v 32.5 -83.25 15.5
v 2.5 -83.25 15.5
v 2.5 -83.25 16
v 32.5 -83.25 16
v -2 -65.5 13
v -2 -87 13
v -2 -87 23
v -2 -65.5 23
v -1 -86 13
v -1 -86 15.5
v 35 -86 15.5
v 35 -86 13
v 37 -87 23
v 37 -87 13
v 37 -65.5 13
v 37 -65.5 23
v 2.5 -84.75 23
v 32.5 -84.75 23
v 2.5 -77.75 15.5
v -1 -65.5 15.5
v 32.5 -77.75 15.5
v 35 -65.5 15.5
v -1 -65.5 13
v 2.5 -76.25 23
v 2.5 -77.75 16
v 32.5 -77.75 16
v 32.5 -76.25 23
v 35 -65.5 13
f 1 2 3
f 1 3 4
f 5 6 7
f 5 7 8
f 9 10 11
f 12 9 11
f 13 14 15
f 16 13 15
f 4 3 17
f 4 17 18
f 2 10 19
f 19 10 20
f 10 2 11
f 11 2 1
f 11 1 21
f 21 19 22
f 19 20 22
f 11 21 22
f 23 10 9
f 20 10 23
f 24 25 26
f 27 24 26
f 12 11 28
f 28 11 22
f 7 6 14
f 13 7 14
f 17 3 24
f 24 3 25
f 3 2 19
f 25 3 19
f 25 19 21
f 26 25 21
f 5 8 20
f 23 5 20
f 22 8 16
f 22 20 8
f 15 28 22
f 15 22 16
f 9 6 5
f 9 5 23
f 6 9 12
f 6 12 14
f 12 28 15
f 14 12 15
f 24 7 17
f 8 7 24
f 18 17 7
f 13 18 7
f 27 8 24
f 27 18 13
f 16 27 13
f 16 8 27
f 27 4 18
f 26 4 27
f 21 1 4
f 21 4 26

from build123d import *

# Parameters (mm, degrees)
SKETCH003_W   = 39
SKETCH003_H   = 21.5
SKETCH003_W_2 = 30
SKETCH003_H_2 = 5.5
PAD003_DEPTH  = 10
SKETCH004_W   = 36
SKETCH004_H   = 20.5
POCKET_DEPTH  = 10
CHAMFER_SIZE2 = 7
CHAMFER_SIZE  = 1.5


with BuildPart() as part:
    # Sketch003 → Pad003 (new body)
    with BuildSketch(Plane.XY.offset(13)):
        with Locations((17.5, -76.25)):
            Rectangle(SKETCH003_W, SKETCH003_H)
        with Locations((17.5, -80.5)):
            Rectangle(SKETCH003_W_2, SKETCH003_H_2, mode=Mode.SUBTRACT)
    extrude(amount=PAD003_DEPTH)

    # Sketch004 → Pocket (cut)
    with BuildSketch(Plane.XY.offset(15.5)):
        with Locations((17, -75.75)):
            Rectangle(SKETCH004_W, SKETCH004_H)
    extrude(amount=-POCKET_DEPTH, mode=Mode.SUBTRACT)

    # Chamfer
    chamfer_edges = [part.edges().sort_by_distance(p)[0] for p in [
        (17.5, -77.75, 23),
        (17.5, -83.25, 23),
    ]]
    chamfer_side = part.faces().sort_by_distance((17.5, -75.208797, 23))[0]
    chamfer(chamfer_edges, length=CHAMFER_SIZE, length2=CHAMFER_SIZE2, reference=chamfer_side)


solid = part.part
